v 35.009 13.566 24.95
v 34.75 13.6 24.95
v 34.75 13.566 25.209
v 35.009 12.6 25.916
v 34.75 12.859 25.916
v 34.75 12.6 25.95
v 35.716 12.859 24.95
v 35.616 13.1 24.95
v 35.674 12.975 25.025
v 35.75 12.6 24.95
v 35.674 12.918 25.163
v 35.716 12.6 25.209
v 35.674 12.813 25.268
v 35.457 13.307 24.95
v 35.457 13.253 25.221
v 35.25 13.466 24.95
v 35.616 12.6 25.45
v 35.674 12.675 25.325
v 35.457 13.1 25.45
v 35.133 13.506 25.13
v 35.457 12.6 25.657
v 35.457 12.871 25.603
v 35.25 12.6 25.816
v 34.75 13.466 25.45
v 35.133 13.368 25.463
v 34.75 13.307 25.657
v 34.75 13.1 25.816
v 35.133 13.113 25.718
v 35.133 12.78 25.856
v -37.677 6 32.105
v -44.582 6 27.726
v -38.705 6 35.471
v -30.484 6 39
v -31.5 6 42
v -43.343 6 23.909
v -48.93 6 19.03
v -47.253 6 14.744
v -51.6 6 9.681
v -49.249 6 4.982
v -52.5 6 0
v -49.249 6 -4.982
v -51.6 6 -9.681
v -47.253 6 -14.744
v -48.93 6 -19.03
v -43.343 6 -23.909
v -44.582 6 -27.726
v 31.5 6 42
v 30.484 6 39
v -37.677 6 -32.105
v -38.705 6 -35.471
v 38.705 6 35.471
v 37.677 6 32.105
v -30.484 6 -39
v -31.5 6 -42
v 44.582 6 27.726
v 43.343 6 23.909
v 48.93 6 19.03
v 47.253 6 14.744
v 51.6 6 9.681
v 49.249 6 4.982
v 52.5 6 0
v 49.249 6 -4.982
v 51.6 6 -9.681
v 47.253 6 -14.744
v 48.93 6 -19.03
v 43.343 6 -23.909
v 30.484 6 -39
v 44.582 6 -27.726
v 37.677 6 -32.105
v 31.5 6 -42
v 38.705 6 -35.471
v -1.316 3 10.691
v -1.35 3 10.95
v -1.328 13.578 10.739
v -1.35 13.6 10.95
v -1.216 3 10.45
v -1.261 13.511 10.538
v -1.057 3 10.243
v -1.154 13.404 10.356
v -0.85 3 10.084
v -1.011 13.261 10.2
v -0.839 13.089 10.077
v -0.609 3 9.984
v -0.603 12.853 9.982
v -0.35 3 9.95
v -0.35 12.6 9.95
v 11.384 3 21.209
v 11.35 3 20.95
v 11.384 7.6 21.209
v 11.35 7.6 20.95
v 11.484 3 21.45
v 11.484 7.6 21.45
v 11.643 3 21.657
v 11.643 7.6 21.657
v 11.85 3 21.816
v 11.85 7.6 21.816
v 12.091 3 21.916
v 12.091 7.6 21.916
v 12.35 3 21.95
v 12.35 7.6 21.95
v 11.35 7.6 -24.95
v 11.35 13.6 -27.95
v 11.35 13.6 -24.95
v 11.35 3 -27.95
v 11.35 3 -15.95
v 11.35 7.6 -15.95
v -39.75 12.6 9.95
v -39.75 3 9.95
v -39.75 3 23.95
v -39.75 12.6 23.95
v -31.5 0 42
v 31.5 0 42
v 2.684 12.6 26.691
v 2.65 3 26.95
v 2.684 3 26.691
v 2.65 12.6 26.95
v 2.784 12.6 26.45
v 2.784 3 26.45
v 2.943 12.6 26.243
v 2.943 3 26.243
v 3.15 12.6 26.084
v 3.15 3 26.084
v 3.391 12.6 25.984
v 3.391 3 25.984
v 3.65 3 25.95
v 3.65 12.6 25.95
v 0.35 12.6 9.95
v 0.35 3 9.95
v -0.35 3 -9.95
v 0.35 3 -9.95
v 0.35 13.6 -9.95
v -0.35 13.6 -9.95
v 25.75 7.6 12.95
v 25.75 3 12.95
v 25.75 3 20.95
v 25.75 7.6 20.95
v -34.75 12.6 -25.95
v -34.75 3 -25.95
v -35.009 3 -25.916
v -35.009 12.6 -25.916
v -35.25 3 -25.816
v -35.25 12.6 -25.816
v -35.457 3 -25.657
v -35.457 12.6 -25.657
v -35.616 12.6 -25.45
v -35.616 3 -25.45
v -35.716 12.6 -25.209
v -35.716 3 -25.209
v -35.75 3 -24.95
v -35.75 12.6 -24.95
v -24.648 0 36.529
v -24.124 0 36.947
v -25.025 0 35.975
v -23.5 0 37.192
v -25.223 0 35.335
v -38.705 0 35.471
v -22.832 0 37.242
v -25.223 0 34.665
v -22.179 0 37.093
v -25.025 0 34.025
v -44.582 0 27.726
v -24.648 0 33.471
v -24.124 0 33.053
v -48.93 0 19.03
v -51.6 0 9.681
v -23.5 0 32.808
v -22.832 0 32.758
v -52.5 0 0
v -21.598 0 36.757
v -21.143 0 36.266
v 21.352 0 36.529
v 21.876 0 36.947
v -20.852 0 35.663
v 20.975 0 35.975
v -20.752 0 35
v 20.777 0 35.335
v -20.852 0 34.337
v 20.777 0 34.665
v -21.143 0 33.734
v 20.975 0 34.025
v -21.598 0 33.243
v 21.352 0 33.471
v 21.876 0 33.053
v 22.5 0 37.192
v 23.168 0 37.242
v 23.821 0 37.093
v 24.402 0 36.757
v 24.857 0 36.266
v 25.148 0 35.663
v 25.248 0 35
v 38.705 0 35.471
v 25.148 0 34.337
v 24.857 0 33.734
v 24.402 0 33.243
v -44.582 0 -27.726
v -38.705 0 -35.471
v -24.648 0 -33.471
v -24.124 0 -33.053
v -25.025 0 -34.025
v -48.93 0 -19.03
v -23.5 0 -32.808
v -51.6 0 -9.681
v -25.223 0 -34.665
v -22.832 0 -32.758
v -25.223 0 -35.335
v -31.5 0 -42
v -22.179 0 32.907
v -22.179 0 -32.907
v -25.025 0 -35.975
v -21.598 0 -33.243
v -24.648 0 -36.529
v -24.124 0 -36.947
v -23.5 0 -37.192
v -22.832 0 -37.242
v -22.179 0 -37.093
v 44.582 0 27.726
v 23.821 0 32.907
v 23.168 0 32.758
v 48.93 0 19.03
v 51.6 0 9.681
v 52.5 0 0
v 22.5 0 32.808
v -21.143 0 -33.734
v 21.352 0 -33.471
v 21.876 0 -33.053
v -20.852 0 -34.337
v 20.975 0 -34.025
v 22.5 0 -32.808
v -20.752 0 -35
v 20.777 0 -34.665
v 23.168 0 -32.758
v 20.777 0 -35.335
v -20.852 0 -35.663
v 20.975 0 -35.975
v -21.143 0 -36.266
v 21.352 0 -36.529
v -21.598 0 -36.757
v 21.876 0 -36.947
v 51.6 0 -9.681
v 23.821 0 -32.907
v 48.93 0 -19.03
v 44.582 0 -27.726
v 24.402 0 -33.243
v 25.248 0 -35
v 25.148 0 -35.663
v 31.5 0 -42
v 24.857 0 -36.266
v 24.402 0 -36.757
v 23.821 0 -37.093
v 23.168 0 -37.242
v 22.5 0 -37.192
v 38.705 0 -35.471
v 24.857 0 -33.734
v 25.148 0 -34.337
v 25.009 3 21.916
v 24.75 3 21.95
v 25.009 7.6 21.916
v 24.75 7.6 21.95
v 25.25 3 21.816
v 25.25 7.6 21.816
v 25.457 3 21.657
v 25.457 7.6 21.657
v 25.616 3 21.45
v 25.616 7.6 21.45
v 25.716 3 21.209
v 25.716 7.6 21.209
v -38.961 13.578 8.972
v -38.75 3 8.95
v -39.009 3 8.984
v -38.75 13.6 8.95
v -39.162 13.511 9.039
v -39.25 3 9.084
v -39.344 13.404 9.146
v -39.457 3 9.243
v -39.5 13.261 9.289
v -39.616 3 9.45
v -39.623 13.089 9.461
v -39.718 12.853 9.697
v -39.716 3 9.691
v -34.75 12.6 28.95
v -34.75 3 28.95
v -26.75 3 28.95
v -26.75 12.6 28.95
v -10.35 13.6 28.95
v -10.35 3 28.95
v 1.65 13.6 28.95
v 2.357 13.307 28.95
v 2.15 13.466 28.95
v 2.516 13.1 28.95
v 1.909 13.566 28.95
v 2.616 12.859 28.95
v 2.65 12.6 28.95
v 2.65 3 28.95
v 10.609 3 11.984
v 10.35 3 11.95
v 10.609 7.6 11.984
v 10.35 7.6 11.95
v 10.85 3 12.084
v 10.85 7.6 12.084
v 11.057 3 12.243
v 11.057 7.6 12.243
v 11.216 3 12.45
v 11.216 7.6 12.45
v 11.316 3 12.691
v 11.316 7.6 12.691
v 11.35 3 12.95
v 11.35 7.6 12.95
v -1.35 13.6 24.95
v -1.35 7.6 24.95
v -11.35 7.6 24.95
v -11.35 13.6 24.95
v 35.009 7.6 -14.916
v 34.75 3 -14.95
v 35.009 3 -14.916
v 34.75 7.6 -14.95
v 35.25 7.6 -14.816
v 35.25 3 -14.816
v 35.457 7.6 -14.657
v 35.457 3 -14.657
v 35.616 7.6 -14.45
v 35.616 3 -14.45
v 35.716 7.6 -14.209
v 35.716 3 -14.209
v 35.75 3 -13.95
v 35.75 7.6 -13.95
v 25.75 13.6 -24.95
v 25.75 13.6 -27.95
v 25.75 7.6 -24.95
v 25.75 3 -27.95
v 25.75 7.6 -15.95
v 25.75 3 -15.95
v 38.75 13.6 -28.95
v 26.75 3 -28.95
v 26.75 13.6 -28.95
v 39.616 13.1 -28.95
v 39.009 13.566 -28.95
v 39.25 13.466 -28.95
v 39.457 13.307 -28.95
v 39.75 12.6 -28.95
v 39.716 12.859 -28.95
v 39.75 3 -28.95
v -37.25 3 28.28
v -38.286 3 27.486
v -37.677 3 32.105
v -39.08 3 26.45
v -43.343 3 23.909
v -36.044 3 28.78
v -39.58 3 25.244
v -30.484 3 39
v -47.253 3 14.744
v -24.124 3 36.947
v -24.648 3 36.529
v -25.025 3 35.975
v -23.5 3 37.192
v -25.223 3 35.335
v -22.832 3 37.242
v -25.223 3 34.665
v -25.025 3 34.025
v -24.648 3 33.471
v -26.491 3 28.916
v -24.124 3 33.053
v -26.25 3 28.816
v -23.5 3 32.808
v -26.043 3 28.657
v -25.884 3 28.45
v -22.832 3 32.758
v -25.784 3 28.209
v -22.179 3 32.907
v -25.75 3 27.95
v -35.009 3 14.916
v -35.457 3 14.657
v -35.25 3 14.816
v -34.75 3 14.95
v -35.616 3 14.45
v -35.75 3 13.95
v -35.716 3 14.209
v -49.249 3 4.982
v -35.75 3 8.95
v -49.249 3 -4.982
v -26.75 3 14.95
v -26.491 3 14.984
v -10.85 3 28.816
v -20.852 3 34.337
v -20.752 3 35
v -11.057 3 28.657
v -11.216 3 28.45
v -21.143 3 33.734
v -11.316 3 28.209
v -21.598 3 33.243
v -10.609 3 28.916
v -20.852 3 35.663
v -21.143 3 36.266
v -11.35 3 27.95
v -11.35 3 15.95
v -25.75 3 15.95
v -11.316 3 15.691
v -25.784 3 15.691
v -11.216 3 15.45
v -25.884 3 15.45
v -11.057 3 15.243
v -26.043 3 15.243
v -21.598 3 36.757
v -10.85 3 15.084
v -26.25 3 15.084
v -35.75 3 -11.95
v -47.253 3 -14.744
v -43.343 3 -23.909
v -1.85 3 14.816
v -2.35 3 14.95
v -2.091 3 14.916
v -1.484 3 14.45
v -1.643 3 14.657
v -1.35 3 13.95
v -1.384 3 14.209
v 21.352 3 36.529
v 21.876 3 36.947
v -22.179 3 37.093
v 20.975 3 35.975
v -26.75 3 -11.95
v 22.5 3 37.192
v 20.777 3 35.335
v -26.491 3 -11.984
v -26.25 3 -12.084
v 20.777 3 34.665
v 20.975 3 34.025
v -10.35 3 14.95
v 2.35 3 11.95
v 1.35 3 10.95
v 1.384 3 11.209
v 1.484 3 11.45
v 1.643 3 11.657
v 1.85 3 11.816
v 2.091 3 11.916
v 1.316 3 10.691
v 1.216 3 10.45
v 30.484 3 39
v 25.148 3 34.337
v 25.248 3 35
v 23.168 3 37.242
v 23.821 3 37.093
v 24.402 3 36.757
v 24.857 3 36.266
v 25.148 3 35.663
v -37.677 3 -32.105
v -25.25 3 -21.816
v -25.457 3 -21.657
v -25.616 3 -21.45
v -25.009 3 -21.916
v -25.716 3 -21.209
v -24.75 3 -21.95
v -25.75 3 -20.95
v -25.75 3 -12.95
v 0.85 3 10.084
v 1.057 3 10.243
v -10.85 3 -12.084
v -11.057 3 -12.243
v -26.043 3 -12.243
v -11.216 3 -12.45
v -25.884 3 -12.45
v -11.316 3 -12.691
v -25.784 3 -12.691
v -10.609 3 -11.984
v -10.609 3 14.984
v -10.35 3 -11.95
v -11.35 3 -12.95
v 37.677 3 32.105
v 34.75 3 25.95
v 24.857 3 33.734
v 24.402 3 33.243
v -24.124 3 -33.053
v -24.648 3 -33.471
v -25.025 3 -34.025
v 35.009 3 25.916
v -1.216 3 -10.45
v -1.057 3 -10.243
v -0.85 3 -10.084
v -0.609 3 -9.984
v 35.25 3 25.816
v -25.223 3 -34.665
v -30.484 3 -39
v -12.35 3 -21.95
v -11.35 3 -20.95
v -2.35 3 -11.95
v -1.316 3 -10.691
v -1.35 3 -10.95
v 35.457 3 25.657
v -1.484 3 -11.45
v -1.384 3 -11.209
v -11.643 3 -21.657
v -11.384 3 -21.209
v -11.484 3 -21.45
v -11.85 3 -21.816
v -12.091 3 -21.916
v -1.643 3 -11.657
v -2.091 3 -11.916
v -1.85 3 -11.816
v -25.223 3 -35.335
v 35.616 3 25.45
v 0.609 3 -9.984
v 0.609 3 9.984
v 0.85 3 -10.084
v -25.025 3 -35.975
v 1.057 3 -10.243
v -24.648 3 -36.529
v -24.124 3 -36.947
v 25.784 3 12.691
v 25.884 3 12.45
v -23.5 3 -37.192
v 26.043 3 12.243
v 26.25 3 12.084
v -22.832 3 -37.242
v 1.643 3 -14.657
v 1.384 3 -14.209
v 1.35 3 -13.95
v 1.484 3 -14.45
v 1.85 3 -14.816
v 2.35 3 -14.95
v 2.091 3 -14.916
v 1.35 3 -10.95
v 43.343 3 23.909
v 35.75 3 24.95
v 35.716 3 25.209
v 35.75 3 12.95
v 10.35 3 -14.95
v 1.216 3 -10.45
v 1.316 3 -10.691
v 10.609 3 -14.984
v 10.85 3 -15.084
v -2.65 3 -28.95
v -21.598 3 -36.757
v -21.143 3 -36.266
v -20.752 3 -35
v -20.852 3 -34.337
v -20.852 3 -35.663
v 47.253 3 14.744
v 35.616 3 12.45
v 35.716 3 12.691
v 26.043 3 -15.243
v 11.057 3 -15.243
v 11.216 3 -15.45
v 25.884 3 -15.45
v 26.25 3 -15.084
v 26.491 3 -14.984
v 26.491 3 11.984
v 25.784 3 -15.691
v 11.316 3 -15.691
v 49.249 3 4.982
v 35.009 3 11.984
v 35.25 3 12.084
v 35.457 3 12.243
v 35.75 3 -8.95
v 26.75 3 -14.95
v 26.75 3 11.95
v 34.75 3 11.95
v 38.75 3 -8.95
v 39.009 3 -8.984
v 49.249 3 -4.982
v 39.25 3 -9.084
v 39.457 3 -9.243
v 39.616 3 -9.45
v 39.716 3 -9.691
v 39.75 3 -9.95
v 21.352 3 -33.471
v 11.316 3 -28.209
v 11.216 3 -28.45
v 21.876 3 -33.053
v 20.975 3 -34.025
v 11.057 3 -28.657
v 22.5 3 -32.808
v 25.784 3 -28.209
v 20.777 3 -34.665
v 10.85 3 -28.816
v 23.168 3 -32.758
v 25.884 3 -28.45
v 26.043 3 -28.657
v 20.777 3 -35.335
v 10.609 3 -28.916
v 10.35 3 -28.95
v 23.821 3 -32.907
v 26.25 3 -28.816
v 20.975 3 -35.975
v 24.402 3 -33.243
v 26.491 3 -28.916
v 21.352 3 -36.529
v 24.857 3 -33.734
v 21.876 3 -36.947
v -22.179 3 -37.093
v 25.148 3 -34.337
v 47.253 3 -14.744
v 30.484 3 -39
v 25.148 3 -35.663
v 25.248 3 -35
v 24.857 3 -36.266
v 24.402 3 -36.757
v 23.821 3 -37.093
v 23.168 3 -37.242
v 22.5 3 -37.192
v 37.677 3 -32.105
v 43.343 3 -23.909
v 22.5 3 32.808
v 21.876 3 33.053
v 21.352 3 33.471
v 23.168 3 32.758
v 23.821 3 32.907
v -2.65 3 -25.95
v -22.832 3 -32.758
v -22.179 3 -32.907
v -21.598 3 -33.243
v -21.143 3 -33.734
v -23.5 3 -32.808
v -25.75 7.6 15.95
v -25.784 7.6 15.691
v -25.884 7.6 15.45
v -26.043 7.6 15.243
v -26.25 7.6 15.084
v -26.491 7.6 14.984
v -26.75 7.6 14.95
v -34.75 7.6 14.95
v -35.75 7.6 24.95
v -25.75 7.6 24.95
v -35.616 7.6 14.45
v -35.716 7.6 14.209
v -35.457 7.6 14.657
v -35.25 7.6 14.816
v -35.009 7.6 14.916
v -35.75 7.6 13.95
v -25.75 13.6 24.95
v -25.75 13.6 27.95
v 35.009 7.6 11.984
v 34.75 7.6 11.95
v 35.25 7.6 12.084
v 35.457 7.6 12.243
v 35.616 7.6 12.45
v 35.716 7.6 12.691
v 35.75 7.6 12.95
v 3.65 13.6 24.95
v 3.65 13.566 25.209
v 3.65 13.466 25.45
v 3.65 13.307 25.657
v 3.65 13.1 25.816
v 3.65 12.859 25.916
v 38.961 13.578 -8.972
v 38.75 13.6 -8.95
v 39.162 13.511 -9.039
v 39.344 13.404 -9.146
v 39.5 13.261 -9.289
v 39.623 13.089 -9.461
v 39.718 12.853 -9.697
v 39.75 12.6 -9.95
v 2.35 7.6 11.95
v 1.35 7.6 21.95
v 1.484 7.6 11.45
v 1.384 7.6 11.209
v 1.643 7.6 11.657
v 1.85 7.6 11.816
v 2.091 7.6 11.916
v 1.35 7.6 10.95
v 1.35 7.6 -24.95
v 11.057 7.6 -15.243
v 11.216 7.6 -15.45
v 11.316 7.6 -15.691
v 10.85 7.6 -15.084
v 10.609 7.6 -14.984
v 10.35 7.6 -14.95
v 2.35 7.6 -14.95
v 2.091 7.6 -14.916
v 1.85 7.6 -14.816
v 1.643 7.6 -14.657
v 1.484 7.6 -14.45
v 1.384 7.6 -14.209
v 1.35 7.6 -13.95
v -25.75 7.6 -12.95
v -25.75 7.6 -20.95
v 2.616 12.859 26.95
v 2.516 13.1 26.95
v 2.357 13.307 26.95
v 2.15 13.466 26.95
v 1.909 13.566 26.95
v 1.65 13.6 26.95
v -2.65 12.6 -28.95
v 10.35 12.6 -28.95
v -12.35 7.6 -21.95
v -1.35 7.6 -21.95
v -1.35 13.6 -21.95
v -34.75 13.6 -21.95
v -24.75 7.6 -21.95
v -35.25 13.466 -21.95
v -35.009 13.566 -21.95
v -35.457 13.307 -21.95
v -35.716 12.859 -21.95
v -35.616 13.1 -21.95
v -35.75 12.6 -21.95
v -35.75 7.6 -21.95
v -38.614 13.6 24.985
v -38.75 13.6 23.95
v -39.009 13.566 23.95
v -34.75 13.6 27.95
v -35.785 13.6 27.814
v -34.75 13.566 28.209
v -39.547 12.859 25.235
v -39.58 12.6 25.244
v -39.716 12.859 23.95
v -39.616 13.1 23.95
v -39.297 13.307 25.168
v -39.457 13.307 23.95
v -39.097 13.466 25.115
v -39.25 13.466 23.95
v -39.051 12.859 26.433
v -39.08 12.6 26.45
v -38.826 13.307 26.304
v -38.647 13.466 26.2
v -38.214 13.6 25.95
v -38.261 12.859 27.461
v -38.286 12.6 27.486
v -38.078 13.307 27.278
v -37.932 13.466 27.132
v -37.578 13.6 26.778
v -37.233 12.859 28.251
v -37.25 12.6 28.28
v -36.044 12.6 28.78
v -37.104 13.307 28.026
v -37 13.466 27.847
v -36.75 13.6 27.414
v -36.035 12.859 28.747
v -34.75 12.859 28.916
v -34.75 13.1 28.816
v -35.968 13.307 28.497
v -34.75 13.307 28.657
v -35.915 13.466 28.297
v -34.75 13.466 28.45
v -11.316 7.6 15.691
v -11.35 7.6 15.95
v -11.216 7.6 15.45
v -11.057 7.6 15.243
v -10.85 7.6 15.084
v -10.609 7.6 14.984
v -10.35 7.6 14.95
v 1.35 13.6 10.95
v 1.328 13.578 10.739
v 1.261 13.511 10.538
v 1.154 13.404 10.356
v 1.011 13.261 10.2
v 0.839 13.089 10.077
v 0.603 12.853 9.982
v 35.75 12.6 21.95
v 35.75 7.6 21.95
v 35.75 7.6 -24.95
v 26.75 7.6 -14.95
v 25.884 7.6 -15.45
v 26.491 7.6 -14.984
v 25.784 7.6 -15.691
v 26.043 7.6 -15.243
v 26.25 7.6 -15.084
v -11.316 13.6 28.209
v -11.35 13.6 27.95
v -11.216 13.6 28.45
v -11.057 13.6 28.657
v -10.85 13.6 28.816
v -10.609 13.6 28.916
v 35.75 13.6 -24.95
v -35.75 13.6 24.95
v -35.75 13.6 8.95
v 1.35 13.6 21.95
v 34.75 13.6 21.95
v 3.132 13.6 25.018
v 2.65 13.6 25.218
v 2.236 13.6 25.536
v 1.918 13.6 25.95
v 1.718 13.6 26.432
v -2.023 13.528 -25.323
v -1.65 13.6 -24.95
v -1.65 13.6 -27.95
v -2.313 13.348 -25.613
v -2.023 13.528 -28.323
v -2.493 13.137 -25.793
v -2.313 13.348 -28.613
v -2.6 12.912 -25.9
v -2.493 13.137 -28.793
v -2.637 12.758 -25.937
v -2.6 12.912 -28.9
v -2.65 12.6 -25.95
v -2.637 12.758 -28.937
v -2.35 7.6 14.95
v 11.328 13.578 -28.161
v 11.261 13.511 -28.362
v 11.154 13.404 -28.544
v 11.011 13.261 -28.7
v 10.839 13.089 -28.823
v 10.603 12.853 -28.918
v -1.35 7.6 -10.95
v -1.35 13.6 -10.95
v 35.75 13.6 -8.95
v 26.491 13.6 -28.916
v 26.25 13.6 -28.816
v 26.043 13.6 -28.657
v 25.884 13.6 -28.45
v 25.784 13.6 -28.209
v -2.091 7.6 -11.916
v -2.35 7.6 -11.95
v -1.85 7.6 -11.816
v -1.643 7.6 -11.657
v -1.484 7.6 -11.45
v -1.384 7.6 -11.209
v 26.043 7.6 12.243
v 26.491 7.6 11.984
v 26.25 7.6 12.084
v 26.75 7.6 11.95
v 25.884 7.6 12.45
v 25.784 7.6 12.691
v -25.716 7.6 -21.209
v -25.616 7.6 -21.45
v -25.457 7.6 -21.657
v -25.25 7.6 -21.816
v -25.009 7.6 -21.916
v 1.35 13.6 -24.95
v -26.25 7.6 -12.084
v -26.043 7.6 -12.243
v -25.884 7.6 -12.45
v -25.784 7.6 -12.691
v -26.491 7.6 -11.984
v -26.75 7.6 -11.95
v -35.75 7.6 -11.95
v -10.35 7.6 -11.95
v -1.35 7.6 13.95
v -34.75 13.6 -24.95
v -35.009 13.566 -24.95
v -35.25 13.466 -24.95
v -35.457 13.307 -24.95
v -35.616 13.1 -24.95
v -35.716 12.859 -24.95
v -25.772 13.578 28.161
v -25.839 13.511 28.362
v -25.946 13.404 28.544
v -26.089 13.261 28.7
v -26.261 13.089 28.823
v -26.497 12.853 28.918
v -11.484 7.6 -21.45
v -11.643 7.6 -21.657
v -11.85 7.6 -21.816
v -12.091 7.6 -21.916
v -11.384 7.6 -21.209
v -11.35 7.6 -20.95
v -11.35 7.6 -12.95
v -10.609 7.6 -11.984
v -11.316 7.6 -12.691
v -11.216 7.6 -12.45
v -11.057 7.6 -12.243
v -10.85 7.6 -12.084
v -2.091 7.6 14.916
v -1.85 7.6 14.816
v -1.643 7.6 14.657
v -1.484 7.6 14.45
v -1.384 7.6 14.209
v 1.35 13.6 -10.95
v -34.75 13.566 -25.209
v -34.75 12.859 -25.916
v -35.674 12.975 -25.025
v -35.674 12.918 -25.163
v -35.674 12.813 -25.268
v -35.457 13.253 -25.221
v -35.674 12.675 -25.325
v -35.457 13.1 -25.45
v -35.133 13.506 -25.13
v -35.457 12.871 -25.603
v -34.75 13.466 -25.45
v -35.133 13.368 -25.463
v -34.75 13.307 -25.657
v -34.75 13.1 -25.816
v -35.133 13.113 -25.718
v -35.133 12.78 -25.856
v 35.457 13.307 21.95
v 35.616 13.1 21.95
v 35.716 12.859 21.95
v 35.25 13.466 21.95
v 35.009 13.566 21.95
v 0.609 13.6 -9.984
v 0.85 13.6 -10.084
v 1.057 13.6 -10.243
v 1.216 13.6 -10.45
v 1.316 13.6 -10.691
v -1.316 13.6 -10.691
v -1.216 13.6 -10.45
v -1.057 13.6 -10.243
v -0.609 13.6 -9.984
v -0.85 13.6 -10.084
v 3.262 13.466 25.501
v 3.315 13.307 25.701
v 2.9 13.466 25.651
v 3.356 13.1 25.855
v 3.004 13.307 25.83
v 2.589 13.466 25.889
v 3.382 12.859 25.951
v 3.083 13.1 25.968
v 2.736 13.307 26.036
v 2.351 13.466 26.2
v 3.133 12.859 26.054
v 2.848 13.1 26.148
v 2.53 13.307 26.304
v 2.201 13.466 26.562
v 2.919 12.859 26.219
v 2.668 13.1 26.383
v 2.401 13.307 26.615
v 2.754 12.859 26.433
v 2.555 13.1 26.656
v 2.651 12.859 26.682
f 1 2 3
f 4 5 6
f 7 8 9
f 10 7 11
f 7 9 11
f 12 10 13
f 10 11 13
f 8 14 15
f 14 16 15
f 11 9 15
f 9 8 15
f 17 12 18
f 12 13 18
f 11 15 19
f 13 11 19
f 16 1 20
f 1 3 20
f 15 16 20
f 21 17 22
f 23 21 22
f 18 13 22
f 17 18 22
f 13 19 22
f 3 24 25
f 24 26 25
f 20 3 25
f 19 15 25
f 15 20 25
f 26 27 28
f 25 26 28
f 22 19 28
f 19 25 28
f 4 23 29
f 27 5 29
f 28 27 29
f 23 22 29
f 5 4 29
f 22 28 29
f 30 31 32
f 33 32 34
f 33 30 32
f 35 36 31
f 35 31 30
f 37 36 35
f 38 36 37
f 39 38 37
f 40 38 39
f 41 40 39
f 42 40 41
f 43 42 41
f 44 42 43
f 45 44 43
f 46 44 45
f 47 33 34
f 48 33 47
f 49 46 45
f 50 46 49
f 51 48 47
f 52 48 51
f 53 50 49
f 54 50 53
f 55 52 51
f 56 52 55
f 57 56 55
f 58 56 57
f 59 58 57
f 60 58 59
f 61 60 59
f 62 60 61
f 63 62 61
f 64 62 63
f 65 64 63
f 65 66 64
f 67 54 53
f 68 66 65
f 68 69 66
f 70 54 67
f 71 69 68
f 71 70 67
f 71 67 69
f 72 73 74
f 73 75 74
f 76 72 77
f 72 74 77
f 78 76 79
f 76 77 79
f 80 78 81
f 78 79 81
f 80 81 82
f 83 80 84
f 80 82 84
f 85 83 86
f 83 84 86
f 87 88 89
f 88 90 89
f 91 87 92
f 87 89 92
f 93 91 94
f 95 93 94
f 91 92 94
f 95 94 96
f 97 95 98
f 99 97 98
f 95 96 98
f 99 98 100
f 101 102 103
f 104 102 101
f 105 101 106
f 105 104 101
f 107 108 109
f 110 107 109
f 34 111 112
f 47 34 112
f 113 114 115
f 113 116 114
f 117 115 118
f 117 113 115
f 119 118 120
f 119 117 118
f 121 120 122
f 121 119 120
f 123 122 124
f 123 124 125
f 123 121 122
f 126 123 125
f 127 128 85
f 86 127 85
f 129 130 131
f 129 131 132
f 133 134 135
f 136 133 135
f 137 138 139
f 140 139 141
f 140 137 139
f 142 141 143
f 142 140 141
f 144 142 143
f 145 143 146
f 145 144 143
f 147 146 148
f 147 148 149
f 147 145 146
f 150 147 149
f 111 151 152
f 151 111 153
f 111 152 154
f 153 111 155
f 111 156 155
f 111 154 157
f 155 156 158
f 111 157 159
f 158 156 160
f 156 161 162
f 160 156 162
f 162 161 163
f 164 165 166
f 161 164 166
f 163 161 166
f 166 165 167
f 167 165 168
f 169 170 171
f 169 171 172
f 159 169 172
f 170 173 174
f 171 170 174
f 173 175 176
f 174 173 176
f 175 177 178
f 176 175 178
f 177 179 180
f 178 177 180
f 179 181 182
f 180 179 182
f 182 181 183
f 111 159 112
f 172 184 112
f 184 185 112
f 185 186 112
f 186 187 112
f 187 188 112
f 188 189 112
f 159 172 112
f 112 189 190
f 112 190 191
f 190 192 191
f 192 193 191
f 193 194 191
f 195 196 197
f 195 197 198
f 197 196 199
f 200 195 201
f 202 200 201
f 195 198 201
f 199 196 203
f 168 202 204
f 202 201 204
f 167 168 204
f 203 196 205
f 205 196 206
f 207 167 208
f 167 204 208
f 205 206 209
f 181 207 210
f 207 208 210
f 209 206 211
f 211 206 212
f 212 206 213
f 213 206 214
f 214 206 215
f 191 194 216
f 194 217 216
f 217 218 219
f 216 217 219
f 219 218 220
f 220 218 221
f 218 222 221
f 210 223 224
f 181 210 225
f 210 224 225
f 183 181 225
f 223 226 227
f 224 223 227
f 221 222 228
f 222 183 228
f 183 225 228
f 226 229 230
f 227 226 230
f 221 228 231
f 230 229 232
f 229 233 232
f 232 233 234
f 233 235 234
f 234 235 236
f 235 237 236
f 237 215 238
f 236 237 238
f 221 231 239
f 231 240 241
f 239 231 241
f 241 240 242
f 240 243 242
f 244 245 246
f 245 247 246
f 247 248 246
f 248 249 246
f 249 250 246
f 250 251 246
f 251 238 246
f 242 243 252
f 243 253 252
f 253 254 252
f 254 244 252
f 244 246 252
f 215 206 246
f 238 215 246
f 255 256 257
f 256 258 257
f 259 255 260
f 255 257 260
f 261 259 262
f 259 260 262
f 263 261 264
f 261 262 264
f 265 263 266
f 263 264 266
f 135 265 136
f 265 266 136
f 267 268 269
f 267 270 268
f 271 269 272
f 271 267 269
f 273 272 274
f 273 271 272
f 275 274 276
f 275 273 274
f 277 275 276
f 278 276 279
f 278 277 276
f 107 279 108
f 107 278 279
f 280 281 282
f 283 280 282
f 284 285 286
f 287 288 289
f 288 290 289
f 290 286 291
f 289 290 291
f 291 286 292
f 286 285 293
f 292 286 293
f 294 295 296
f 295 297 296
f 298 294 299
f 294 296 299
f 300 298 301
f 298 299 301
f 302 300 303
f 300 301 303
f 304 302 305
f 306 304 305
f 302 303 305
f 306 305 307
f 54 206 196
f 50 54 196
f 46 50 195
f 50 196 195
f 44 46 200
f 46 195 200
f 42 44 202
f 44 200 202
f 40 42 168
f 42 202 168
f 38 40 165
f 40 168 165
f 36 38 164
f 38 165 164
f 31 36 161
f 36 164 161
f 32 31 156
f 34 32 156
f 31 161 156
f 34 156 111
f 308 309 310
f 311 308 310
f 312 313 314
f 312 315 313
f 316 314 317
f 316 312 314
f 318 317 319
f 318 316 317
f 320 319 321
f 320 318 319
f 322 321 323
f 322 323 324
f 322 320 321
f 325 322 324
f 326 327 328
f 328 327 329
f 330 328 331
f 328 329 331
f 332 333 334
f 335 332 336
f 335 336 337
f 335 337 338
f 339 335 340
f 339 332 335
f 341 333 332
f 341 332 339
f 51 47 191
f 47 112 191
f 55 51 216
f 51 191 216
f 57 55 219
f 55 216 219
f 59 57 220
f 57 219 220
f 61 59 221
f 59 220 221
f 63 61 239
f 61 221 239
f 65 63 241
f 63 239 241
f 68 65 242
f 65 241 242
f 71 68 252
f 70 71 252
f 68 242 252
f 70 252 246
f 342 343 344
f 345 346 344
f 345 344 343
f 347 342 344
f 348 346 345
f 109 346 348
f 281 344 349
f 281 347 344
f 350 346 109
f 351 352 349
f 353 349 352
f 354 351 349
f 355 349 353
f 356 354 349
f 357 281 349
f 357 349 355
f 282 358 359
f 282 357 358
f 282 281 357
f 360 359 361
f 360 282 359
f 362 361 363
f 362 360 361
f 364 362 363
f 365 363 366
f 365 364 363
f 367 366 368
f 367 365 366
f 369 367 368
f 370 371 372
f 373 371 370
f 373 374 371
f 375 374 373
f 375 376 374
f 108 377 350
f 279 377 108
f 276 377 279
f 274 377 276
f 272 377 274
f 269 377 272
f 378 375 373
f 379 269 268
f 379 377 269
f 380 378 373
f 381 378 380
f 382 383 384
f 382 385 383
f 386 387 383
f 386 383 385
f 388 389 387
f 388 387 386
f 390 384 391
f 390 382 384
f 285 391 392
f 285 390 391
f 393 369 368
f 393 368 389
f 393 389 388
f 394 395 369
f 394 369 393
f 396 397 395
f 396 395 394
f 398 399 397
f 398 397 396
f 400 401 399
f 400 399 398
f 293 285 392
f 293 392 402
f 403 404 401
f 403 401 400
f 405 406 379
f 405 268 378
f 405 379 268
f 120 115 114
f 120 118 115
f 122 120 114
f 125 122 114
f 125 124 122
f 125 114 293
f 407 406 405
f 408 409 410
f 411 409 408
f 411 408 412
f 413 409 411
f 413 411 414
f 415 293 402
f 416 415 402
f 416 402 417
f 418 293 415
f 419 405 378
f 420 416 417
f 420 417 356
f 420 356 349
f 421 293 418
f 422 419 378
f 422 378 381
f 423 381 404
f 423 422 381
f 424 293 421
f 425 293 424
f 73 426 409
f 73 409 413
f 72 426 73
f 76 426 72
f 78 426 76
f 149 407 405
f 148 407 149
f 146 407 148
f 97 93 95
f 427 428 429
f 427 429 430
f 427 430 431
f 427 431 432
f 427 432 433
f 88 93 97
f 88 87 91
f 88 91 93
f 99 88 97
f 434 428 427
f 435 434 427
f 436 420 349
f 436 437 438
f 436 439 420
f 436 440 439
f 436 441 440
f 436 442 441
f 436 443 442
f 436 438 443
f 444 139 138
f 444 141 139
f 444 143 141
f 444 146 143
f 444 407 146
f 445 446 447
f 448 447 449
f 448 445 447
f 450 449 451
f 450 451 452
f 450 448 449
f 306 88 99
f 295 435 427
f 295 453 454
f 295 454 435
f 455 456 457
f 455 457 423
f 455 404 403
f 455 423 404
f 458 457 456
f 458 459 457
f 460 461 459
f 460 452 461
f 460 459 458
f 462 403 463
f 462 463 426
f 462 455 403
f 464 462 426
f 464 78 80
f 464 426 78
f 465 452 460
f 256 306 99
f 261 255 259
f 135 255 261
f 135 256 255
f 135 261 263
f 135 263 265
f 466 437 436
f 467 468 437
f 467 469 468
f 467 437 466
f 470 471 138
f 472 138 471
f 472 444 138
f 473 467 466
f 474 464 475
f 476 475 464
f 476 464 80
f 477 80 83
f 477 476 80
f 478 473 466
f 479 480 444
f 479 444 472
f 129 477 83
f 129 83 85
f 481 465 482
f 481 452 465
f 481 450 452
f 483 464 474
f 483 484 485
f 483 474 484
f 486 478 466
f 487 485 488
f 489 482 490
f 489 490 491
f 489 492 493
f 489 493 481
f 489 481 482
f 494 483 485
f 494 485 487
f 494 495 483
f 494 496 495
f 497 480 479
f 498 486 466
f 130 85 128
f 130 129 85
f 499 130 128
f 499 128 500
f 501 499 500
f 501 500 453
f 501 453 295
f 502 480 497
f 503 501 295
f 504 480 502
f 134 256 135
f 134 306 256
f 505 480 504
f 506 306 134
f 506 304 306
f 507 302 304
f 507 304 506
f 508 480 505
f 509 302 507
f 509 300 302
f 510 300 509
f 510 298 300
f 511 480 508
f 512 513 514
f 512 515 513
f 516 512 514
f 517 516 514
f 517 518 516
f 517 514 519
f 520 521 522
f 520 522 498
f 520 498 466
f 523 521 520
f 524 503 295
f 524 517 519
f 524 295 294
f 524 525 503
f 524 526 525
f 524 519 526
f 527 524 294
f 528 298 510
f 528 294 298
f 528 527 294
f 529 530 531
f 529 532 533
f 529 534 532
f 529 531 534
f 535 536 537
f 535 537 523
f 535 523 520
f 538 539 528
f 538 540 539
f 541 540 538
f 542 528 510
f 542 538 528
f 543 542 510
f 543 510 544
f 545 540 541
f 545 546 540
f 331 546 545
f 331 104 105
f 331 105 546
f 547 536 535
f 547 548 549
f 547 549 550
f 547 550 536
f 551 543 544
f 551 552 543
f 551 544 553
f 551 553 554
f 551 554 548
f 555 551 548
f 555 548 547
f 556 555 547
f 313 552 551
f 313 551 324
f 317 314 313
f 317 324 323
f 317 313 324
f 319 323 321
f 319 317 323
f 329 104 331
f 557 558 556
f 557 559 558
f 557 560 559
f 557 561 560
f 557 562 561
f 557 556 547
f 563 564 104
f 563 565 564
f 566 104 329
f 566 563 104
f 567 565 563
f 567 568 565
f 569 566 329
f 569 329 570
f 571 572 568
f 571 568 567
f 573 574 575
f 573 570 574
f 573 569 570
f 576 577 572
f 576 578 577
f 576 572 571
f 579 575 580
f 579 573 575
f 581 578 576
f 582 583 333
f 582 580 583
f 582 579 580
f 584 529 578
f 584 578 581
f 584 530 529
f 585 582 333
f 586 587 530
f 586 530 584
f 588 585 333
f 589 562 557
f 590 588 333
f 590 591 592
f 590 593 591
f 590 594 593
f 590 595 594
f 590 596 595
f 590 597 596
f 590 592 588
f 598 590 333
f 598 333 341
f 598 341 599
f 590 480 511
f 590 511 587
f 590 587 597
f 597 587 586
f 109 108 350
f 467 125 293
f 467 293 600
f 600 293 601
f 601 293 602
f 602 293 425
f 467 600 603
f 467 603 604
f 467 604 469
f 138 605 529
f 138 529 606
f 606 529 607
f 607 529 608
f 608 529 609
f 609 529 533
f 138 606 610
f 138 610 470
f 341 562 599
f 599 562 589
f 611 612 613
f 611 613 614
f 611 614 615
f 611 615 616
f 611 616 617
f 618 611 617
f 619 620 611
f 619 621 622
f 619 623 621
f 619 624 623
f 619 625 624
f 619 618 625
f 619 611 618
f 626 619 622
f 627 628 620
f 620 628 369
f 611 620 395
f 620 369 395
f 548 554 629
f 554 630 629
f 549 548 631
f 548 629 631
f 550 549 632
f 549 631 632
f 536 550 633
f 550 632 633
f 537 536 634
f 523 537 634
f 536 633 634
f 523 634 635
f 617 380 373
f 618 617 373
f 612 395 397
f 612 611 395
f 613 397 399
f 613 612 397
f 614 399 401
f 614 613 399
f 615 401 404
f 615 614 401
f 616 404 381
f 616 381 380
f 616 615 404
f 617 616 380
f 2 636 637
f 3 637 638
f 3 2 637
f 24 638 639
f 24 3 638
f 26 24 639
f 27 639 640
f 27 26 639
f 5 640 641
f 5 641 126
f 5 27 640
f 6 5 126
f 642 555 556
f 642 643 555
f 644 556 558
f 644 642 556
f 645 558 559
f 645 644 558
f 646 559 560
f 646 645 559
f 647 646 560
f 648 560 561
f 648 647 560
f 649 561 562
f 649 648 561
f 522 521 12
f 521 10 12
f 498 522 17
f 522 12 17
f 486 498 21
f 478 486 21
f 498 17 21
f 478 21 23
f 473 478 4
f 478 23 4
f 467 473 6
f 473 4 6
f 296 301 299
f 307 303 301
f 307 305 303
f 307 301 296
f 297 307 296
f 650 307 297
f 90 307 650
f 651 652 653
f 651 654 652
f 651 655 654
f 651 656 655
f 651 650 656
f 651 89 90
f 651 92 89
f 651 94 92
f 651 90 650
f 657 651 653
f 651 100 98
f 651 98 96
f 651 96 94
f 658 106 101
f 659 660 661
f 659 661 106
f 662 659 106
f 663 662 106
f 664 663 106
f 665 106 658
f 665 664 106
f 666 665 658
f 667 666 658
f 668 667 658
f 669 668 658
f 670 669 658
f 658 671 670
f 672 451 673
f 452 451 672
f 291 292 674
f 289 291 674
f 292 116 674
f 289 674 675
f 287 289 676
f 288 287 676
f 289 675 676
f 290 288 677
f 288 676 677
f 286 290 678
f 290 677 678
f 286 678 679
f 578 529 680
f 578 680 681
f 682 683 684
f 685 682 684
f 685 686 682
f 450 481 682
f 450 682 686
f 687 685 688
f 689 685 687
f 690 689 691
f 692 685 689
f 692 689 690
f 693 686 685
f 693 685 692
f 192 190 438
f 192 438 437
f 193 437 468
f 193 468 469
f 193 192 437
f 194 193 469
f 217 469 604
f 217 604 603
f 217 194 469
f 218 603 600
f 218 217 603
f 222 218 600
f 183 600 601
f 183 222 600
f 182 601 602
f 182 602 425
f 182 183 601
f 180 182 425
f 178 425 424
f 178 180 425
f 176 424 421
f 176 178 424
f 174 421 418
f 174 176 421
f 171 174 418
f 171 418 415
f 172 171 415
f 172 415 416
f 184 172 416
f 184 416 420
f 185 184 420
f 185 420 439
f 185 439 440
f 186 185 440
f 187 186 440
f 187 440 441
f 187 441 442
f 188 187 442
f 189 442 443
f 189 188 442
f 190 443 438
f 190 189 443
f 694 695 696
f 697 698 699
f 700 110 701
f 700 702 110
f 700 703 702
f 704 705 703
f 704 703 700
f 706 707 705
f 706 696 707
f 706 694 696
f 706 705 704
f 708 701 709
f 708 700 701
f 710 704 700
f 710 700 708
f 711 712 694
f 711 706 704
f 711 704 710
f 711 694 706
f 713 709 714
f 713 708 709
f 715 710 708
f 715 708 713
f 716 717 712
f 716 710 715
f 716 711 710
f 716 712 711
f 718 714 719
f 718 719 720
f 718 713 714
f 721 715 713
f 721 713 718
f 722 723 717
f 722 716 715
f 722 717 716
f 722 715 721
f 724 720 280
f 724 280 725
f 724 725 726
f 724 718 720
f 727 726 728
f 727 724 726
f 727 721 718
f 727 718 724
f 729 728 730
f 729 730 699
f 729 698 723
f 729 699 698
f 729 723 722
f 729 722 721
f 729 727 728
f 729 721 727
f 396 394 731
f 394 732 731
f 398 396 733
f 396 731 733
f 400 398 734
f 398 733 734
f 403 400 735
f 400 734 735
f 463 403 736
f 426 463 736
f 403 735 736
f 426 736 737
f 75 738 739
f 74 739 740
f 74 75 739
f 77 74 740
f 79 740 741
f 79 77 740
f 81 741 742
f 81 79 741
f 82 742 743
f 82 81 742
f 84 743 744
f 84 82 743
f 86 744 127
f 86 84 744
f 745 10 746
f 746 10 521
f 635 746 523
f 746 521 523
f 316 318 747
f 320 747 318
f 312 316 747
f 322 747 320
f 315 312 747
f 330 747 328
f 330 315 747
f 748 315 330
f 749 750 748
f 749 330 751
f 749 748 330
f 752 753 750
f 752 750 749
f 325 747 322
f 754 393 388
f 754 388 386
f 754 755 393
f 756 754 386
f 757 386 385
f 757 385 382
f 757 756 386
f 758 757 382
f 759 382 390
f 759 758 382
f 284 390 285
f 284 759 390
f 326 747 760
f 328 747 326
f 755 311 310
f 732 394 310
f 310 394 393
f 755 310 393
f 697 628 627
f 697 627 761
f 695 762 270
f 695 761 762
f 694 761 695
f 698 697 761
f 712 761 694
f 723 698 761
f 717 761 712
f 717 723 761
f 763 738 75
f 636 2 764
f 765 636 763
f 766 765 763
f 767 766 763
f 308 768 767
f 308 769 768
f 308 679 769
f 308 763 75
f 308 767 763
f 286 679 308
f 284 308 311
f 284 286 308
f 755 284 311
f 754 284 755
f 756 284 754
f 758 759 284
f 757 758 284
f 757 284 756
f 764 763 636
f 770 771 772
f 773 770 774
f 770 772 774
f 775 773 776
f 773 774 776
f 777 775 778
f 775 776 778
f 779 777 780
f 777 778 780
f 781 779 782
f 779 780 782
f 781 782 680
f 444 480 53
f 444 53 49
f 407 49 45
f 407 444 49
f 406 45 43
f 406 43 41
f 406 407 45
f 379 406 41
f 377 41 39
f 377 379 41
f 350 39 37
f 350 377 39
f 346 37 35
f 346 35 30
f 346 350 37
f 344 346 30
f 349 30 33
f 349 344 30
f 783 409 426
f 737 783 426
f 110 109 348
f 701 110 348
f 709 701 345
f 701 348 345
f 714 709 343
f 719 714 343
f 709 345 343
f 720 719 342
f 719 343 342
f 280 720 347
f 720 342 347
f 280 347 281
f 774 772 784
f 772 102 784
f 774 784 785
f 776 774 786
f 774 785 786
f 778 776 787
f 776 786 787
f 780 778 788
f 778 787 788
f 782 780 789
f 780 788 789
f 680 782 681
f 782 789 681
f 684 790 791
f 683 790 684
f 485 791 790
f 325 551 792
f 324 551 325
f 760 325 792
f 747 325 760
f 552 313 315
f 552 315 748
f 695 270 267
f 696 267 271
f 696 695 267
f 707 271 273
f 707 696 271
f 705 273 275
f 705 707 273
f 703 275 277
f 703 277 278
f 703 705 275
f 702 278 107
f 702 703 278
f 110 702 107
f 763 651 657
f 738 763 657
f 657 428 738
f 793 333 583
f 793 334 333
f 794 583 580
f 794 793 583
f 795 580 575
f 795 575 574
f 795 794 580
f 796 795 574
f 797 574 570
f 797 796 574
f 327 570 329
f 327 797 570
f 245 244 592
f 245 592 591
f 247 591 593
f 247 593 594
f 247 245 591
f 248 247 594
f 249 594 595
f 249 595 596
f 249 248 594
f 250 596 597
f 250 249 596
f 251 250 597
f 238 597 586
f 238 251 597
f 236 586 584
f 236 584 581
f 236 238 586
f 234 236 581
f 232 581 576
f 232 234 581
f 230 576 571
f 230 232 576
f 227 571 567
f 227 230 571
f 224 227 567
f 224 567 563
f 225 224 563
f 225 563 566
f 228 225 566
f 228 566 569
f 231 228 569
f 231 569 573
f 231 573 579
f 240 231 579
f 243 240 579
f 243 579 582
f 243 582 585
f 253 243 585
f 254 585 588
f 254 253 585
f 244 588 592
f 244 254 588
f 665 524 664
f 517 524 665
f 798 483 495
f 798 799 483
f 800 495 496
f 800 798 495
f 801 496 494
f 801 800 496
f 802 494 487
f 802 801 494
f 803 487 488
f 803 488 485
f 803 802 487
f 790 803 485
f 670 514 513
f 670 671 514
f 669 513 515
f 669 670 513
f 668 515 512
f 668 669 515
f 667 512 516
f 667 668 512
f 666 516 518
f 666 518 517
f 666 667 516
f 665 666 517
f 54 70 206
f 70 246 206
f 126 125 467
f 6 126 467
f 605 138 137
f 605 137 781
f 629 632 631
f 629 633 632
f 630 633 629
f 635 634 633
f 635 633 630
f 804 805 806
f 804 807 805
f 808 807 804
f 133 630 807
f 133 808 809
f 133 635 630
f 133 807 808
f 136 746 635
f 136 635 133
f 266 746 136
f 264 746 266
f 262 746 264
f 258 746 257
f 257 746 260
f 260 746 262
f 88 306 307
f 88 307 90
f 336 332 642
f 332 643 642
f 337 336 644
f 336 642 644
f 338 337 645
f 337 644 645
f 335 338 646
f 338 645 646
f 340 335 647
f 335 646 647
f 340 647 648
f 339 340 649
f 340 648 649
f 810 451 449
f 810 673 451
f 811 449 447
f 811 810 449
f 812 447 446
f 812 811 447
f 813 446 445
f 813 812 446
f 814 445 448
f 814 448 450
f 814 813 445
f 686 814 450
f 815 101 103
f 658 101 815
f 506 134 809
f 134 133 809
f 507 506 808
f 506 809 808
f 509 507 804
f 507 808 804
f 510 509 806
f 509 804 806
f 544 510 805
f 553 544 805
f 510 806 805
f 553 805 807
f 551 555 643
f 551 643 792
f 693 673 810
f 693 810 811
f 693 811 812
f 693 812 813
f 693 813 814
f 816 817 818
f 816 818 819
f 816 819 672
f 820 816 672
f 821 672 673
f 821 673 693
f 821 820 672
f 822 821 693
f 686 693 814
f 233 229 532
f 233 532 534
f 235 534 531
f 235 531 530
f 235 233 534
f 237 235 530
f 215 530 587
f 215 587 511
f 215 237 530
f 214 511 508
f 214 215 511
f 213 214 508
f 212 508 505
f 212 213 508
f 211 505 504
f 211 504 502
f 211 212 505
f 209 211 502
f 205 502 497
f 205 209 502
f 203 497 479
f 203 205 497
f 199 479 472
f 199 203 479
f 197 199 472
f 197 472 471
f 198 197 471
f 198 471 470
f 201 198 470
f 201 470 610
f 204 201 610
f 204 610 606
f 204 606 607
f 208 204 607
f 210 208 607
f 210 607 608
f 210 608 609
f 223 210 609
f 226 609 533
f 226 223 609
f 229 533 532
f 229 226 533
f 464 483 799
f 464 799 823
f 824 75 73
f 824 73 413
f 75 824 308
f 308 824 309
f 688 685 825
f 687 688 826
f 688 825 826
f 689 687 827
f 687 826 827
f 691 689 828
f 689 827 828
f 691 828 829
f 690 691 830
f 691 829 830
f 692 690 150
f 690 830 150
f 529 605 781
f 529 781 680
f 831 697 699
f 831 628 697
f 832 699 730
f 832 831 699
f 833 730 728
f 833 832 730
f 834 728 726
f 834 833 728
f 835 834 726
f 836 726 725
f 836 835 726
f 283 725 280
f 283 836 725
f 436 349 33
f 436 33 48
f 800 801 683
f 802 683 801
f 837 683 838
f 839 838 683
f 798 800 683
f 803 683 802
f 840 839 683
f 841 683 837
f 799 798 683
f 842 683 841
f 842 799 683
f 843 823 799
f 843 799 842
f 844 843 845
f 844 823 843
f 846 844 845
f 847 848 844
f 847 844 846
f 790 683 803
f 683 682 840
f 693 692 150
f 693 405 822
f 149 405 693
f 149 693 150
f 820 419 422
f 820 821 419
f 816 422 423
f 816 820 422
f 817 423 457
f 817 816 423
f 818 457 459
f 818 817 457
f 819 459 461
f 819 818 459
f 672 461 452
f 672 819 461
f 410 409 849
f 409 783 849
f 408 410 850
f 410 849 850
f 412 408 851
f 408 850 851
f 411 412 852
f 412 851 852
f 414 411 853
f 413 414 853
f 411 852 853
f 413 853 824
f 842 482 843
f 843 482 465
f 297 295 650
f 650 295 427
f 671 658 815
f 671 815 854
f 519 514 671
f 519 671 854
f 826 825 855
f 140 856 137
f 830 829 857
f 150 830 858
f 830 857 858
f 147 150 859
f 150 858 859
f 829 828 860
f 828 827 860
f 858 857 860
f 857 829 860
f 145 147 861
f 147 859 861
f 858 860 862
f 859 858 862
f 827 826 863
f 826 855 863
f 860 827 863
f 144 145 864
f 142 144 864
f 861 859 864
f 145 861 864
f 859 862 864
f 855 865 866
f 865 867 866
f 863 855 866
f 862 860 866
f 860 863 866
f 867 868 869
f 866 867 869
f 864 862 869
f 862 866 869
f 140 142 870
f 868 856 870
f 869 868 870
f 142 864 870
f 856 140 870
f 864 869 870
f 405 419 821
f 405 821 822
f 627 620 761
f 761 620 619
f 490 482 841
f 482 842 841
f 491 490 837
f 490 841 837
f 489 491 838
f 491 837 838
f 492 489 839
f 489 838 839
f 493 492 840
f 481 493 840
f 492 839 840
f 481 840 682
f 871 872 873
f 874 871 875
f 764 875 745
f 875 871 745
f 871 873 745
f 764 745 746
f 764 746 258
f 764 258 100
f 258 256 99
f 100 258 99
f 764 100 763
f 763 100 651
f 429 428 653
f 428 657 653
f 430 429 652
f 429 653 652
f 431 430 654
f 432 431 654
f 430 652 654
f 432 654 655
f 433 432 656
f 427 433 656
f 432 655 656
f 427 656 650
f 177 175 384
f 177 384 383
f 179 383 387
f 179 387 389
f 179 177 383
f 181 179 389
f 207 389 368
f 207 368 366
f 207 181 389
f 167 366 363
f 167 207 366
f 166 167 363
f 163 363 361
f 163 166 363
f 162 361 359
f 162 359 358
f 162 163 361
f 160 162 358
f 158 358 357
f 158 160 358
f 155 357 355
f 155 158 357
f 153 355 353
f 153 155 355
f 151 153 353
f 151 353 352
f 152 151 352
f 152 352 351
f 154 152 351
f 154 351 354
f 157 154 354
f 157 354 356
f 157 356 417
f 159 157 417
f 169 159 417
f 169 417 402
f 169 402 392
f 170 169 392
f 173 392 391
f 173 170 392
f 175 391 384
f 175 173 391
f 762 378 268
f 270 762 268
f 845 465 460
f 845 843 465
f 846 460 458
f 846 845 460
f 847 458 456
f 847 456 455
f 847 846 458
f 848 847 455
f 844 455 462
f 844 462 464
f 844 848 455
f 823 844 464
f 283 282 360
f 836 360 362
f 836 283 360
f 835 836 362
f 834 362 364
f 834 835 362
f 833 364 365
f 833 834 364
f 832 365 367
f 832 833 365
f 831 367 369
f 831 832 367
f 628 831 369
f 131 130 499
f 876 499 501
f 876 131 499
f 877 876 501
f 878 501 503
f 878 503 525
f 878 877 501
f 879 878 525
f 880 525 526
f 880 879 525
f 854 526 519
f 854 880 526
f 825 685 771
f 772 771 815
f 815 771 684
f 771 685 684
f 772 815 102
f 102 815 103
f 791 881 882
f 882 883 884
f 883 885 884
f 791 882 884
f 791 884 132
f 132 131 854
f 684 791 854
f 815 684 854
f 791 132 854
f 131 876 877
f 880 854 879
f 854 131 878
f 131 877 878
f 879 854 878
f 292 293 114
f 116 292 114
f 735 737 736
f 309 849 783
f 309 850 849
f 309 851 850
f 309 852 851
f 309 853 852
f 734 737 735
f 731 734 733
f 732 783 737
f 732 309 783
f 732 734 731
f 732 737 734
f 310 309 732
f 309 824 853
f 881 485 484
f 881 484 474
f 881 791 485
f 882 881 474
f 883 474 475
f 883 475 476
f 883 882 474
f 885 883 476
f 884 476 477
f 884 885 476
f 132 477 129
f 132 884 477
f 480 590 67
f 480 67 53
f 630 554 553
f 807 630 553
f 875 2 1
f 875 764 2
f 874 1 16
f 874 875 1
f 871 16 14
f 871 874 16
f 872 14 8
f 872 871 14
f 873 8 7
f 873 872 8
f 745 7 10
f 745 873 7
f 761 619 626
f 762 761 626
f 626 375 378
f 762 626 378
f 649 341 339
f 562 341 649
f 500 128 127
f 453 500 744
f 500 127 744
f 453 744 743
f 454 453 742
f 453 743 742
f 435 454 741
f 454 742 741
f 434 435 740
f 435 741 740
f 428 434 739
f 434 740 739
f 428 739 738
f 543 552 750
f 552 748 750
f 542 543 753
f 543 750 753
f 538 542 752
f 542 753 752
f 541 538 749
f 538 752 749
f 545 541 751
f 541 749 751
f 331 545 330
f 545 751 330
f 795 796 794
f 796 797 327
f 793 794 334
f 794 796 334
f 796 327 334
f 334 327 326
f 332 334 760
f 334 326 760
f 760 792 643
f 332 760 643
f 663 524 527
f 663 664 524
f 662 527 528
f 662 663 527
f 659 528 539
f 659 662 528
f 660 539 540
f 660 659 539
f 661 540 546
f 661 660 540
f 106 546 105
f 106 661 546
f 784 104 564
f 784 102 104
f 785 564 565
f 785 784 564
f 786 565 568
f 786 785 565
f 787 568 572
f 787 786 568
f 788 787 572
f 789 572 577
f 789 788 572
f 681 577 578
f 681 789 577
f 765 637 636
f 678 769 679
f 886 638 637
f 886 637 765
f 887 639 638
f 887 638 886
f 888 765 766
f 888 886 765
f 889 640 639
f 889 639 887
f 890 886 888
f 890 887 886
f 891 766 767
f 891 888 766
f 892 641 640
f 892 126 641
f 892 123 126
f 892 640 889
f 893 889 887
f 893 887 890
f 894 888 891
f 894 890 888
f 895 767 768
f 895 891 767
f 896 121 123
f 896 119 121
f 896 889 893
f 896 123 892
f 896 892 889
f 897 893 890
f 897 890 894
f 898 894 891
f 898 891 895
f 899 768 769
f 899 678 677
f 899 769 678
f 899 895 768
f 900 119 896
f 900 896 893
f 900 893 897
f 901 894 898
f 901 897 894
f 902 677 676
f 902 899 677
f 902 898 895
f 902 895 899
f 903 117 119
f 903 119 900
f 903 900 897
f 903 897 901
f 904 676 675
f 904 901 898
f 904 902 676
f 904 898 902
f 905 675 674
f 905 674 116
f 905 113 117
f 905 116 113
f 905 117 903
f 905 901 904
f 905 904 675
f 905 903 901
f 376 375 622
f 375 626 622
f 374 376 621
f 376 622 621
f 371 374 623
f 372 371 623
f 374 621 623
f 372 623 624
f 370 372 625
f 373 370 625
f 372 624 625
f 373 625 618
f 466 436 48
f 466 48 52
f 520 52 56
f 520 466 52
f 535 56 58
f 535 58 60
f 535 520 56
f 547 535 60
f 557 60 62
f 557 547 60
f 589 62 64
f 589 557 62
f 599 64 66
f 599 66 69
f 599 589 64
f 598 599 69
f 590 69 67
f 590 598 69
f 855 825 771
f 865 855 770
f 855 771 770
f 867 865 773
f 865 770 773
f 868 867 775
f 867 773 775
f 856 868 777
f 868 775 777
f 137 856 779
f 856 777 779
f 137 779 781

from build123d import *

# Parameters (mm, degrees)
A_BASE_T42_OUTLINE_R       = 2.2479
A_BASE_T42_OUTLINE_R_2     = 1
A_BASE_T42_DEPTH           = 3
OUTER_BRIM_DEPTH           = 3
SKETCH5_W                  = 15
SKETCH5_H                  = 3
BASE_SUPPORTS_DEPTH        = 3
BASE_SUPPORTS_CHAMFER_SIZE = 3
COVER_START                = -3
SKETCH6_R                  = 1
COVER_DEPTH                = 3
SKETCH9_W                  = 15
SKETCH9_H                  = 6
CUT_EXTRUDE1_DEPTH         = 10
SKETCH11_W                 = 10
SKETCH11_H                 = 10
BOSS_EXTRUDE1_DEPTH        = 4.6
BOSS_EXTRUDE2_DEPTH        = 10.6
FILLET1_R                  = 1
FILLET2_R                  = 5


# Read off the part's stored shape, not the designer's step: a_base_t42
# Some blends are built 0.0001 mm under size
with BuildPart() as part:
    # a_base_t42 outline → a_base_t42 (new body)
    with BuildSketch(Plane(origin=(0, 0, 0), x_dir=(1, 0, 0), z_dir=(0, 1, 0))):
        with BuildLine():
            ThreePointArc((31.5, -42), (52.5, 0), (31.5, 42))
            Line((31.5, 42), (-31.5, 42))
            ThreePointArc((-31.5, 42), (-52.5, 0), (-31.5, -42))
            Line((-31.5, -42), (31.5, -42))
        make_face()
        with Locations((-23, -35)):
            Circle(A_BASE_T42_OUTLINE_R, mode=Mode.SUBTRACT)
        with Locations((23, -35)):
            Circle(A_BASE_T42_OUTLINE_R, mode=Mode.SUBTRACT)
        with Locations((-40.25, 0)):
            Circle(A_BASE_T42_OUTLINE_R_2, mode=Mode.SUBTRACT)
        with Locations((-23, 35)):
            Circle(A_BASE_T42_OUTLINE_R, mode=Mode.SUBTRACT)
        with Locations((40.25, 0)):
            Circle(A_BASE_T42_OUTLINE_R_2, mode=Mode.SUBTRACT)
        with Locations((23, 35)):
            Circle(A_BASE_T42_OUTLINE_R, mode=Mode.SUBTRACT)
    extrude(amount=A_BASE_T42_DEPTH)

    # Sketch1 → Outer Brim (add)
    with BuildSketch(Plane(origin=(0, 3, 0), x_dir=(1, 0, 0), z_dir=(0, 1, 0))):
        with BuildLine():
            Line((-31.5, -42), (31.5, -42))
            ThreePointArc((31.5, -42), (52.5, 0), (31.5, 42))
            Line((31.5, 42), (-31.5, 42))
            ThreePointArc((-31.5, 42), (-52.5, 0), (-31.5, -42))
        make_face()
        with BuildLine():
            Line((30.483602149, 39), (-30.483602149, 39))
            ThreePointArc((-30.483602149, 39), (-49.5, 0), (-30.483602149, -39))
            Line((-30.483602149, -39), (30.483602149, -39))
            ThreePointArc((30.483602149, -39), (49.5, 0), (30.483602149, 39))
        make_face(mode=Mode.SUBTRACT)
    extrude(amount=OUTER_BRIM_DEPTH)

    # Sketch5 → Base Supports (add)
    with BuildSketch(Plane(origin=(0, 3, 0), x_dir=(1, 0, 0), z_dir=(0, 1, 0))):
        with Locations((0, -27)):
            Rectangle(SKETCH5_W, SKETCH5_H)
        with Locations((0, 27)):
            Rectangle(SKETCH5_W, SKETCH5_H)
    extrude(amount=BASE_SUPPORTS_DEPTH)

    # Base Supports Chamfer
    base_supports_chamfer_edges = [part.edges().sort_by_distance(p)[0] for p in [
        (0, 3, 28.5),
        (0, 3, -28.5),
    ]]
    chamfer(base_supports_chamfer_edges, length=BASE_SUPPORTS_CHAMFER_SIZE - 0.0001)  # a hair under: the kernel refuses the full size

    # Sketch6 → Cover (add)
    with BuildSketch(Plane(origin=(0, 3, 0), x_dir=(1, 0, 0), z_dir=(0, 1, 0)).offset(COVER_START)):
        with Locations((-40.25, 0)):
            Circle(SKETCH6_R)
        with Locations((40.25, 0)):
            Circle(SKETCH6_R)
    extrude(amount=COVER_DEPTH)

    # Sketch9 → Cut-Extrude1 (cut)
    with BuildSketch(Plane(origin=(0, 3, 0), x_dir=(1, 0, 0), z_dir=(0, 1, 0))):
        with Locations((0, 28.5)):
            Rectangle(SKETCH9_W, SKETCH9_H)
        with Locations((0, -28.5)):
            Rectangle(SKETCH9_W, SKETCH9_H)
    extrude(amount=CUT_EXTRUDE1_DEPTH, mode=Mode.SUBTRACT)

    # Sketch11 → Boss-Extrude1 (add)
    with BuildSketch(Plane(origin=(5.553919153, 3, -19.484186112), x_dir=(-1, 0, 0), z_dir=(0, 1, 0))):
        with Locations((11.903919153, 39.434186112)):
            Rectangle(SKETCH11_W, SKETCH11_H)
        with Locations((36.303919153, 39.434186112)):
            Rectangle(SKETCH11_W, SKETCH11_H)
        with Locations((36.303919153, 2.534186112)):
            Rectangle(SKETCH11_W, SKETCH11_H)
        with Locations((11.903919153, 2.534186112)):
            Rectangle(SKETCH11_W, SKETCH11_H)
        with Locations((-0.796080847, -0.465813888)):
            Rectangle(SKETCH11_W, SKETCH11_H)
        with Locations((-0.796080847, 36.434186112)):
            Rectangle(SKETCH11_W, SKETCH11_H)
        with Locations((-25.196080847, 36.434186112)):
            Rectangle(SKETCH11_W, SKETCH11_H)
        with Locations((-25.196080847, -0.465813888)):
            Rectangle(SKETCH11_W, SKETCH11_H)
    extrude(amount=BOSS_EXTRUDE1_DEPTH)

    # Sketch13 → Boss-Extrude2 (add)
    with BuildSketch(Plane(origin=(5.553919153, 3, -19.484186112), x_dir=(-1, 0, 0), z_dir=(0, 1, 0))):
        Polygon((2.903919153, 48.434186112), (2.903919153, 45.434186112), (-30.196080847, 45.434186112), (-30.196080847, 41.434186112), (4.203919153, 41.434186112), (4.203919153, 29.434186112), (6.903919153, 29.434186112), (6.903919153, 44.434186112), (16.903919153, 44.434186112), (16.903919153, 48.434186112), align=None)
        Polygon((41.303919153, -2.465813888), (41.303919153, -6.465813888), (8.203919153, -6.465813888), (8.203919153, -9.465813888), (-5.796080847, -9.465813888), (-5.796080847, -5.465813888), (4.203919153, -5.465813888), (4.203919153, 9.534186112), (6.903919153, 9.534186112), (6.903919153, -2.465813888), align=None)
        Polygon((41.303919153, 44.434186112), (41.303919153, 28.434186112), (45.303919153, 28.434186112), (45.303919153, 48.434186112), (31.303919153, 48.434186112), (31.303919153, 44.434186112), align=None)
        Polygon((-34.196080847, -9.465813888), (-34.196080847, 10.534186112), (-30.196080847, 10.534186112), (-30.196080847, -5.465813888), (-20.196080847, -5.465813888), (-20.196080847, -9.465813888), align=None)
    extrude(amount=BOSS_EXTRUDE2_DEPTH)

    # Fillet1
    fillet1_edges = [part.edges().sort_by_distance(p)[0] for p in [
        (11.35, 5.3, 11.95),
        (25.75, 5.3, 11.95),
        (11.35, 5.3, -14.95),
        (25.75, 5.3, -14.95),
        (0, 13.6, 9.95),
        (-25.75, 5.3, 14.95),
        (-11.35, 5.3, 14.95),
        (-11.35, 5.3, -11.95),
        (-25.75, 5.3, -11.95),
        (-35.75, 5.3, 14.95),
        (1.35, 8.3, -9.95),
        (-1.35, 8.3, -9.95),
        (-1.35, 5.3, -11.95),
        (-11.35, 5.3, -21.95),
        (-25.75, 5.3, -21.95),
        (19.2, 13.6, 25.95),
        (39.75, 13.6, -18.95),
        (4.35, 13.6, -28.95),
        (-2.65, 13.6, -27.45),
        (-19.2, 13.6, -25.95),
        (-35.75, 13.6, -23.95),
        (35.75, 13.6, 23.95),
        (39.75, 8.3, -8.95),
        (11.35, 5.3, 21.95),
        (25.75, 5.3, 21.95),
        (35.75, 5.3, -14.95),
        (1.35, 5.3, 11.95),
        (1.35, 5.3, -14.95),
        (-1.35, 5.3, 14.95),
        (-1.35, 8.3, 9.95),
        (1.35, 8.3, 9.95),
        (35.75, 5.3, 11.95),
        (35.75, 8.3, 25.95),
        (2.65, 13.6, 27.45),
        (2.65, 8.3, 25.95),
        (-32.75, 13.6, 28.95),
        (-39.75, 13.6, 18.95),
        (-39.75, 8.3, 8.95),
        (-35.75, 8.3, -25.95),
        (25.75, 8.3, -28.95),
        (11.35, 8.3, -28.95),
        (-11.35, 8.3, 28.95),
        (-25.75, 8.3, 28.95),
    ]]
    fillet(fillet1_edges, radius=FILLET1_R - 0.0001)  # a hair under: the kernel refuses the full size

    # Fillet2
    # the kernel refuses this fillet: 5 mm, written as the material it takes off along each edge
    with BuildSketch(Plane(origin=(-34.75, 13.6, 23.95), x_dir=(-1, 0, 0), z_dir=(0, 0, -1))) as fillet2_piece_1:
        with BuildLine():
            CenterArc((4.0001, -0.9999), 0.9999, 0, 90)
            Line((5, -0.9999), (5, 0))
            Line((5, 0), (4.0001, 0))
        make_face()
    revolve(axis=Axis((-34.75, 13.6, 23.95), (0, 1, 0)), revolution_arc=90, mode=Mode.SUBTRACT)
    with BuildSketch(Plane(origin=(-39.75, 3, 28.95), x_dir=(0, 0, -1), z_dir=(0, 1, 0))) as fillet2_piece_2:
        with BuildLine():
            CenterArc((FILLET2_R, -FILLET2_R), FILLET2_R, 90, 90)
            Line((0, -FILLET2_R), (0, 0))
            Line((0, 0), (FILLET2_R, 0))
        make_face()
    extrude(amount=10.6, mode=Mode.SUBTRACT)


solid = part.part
